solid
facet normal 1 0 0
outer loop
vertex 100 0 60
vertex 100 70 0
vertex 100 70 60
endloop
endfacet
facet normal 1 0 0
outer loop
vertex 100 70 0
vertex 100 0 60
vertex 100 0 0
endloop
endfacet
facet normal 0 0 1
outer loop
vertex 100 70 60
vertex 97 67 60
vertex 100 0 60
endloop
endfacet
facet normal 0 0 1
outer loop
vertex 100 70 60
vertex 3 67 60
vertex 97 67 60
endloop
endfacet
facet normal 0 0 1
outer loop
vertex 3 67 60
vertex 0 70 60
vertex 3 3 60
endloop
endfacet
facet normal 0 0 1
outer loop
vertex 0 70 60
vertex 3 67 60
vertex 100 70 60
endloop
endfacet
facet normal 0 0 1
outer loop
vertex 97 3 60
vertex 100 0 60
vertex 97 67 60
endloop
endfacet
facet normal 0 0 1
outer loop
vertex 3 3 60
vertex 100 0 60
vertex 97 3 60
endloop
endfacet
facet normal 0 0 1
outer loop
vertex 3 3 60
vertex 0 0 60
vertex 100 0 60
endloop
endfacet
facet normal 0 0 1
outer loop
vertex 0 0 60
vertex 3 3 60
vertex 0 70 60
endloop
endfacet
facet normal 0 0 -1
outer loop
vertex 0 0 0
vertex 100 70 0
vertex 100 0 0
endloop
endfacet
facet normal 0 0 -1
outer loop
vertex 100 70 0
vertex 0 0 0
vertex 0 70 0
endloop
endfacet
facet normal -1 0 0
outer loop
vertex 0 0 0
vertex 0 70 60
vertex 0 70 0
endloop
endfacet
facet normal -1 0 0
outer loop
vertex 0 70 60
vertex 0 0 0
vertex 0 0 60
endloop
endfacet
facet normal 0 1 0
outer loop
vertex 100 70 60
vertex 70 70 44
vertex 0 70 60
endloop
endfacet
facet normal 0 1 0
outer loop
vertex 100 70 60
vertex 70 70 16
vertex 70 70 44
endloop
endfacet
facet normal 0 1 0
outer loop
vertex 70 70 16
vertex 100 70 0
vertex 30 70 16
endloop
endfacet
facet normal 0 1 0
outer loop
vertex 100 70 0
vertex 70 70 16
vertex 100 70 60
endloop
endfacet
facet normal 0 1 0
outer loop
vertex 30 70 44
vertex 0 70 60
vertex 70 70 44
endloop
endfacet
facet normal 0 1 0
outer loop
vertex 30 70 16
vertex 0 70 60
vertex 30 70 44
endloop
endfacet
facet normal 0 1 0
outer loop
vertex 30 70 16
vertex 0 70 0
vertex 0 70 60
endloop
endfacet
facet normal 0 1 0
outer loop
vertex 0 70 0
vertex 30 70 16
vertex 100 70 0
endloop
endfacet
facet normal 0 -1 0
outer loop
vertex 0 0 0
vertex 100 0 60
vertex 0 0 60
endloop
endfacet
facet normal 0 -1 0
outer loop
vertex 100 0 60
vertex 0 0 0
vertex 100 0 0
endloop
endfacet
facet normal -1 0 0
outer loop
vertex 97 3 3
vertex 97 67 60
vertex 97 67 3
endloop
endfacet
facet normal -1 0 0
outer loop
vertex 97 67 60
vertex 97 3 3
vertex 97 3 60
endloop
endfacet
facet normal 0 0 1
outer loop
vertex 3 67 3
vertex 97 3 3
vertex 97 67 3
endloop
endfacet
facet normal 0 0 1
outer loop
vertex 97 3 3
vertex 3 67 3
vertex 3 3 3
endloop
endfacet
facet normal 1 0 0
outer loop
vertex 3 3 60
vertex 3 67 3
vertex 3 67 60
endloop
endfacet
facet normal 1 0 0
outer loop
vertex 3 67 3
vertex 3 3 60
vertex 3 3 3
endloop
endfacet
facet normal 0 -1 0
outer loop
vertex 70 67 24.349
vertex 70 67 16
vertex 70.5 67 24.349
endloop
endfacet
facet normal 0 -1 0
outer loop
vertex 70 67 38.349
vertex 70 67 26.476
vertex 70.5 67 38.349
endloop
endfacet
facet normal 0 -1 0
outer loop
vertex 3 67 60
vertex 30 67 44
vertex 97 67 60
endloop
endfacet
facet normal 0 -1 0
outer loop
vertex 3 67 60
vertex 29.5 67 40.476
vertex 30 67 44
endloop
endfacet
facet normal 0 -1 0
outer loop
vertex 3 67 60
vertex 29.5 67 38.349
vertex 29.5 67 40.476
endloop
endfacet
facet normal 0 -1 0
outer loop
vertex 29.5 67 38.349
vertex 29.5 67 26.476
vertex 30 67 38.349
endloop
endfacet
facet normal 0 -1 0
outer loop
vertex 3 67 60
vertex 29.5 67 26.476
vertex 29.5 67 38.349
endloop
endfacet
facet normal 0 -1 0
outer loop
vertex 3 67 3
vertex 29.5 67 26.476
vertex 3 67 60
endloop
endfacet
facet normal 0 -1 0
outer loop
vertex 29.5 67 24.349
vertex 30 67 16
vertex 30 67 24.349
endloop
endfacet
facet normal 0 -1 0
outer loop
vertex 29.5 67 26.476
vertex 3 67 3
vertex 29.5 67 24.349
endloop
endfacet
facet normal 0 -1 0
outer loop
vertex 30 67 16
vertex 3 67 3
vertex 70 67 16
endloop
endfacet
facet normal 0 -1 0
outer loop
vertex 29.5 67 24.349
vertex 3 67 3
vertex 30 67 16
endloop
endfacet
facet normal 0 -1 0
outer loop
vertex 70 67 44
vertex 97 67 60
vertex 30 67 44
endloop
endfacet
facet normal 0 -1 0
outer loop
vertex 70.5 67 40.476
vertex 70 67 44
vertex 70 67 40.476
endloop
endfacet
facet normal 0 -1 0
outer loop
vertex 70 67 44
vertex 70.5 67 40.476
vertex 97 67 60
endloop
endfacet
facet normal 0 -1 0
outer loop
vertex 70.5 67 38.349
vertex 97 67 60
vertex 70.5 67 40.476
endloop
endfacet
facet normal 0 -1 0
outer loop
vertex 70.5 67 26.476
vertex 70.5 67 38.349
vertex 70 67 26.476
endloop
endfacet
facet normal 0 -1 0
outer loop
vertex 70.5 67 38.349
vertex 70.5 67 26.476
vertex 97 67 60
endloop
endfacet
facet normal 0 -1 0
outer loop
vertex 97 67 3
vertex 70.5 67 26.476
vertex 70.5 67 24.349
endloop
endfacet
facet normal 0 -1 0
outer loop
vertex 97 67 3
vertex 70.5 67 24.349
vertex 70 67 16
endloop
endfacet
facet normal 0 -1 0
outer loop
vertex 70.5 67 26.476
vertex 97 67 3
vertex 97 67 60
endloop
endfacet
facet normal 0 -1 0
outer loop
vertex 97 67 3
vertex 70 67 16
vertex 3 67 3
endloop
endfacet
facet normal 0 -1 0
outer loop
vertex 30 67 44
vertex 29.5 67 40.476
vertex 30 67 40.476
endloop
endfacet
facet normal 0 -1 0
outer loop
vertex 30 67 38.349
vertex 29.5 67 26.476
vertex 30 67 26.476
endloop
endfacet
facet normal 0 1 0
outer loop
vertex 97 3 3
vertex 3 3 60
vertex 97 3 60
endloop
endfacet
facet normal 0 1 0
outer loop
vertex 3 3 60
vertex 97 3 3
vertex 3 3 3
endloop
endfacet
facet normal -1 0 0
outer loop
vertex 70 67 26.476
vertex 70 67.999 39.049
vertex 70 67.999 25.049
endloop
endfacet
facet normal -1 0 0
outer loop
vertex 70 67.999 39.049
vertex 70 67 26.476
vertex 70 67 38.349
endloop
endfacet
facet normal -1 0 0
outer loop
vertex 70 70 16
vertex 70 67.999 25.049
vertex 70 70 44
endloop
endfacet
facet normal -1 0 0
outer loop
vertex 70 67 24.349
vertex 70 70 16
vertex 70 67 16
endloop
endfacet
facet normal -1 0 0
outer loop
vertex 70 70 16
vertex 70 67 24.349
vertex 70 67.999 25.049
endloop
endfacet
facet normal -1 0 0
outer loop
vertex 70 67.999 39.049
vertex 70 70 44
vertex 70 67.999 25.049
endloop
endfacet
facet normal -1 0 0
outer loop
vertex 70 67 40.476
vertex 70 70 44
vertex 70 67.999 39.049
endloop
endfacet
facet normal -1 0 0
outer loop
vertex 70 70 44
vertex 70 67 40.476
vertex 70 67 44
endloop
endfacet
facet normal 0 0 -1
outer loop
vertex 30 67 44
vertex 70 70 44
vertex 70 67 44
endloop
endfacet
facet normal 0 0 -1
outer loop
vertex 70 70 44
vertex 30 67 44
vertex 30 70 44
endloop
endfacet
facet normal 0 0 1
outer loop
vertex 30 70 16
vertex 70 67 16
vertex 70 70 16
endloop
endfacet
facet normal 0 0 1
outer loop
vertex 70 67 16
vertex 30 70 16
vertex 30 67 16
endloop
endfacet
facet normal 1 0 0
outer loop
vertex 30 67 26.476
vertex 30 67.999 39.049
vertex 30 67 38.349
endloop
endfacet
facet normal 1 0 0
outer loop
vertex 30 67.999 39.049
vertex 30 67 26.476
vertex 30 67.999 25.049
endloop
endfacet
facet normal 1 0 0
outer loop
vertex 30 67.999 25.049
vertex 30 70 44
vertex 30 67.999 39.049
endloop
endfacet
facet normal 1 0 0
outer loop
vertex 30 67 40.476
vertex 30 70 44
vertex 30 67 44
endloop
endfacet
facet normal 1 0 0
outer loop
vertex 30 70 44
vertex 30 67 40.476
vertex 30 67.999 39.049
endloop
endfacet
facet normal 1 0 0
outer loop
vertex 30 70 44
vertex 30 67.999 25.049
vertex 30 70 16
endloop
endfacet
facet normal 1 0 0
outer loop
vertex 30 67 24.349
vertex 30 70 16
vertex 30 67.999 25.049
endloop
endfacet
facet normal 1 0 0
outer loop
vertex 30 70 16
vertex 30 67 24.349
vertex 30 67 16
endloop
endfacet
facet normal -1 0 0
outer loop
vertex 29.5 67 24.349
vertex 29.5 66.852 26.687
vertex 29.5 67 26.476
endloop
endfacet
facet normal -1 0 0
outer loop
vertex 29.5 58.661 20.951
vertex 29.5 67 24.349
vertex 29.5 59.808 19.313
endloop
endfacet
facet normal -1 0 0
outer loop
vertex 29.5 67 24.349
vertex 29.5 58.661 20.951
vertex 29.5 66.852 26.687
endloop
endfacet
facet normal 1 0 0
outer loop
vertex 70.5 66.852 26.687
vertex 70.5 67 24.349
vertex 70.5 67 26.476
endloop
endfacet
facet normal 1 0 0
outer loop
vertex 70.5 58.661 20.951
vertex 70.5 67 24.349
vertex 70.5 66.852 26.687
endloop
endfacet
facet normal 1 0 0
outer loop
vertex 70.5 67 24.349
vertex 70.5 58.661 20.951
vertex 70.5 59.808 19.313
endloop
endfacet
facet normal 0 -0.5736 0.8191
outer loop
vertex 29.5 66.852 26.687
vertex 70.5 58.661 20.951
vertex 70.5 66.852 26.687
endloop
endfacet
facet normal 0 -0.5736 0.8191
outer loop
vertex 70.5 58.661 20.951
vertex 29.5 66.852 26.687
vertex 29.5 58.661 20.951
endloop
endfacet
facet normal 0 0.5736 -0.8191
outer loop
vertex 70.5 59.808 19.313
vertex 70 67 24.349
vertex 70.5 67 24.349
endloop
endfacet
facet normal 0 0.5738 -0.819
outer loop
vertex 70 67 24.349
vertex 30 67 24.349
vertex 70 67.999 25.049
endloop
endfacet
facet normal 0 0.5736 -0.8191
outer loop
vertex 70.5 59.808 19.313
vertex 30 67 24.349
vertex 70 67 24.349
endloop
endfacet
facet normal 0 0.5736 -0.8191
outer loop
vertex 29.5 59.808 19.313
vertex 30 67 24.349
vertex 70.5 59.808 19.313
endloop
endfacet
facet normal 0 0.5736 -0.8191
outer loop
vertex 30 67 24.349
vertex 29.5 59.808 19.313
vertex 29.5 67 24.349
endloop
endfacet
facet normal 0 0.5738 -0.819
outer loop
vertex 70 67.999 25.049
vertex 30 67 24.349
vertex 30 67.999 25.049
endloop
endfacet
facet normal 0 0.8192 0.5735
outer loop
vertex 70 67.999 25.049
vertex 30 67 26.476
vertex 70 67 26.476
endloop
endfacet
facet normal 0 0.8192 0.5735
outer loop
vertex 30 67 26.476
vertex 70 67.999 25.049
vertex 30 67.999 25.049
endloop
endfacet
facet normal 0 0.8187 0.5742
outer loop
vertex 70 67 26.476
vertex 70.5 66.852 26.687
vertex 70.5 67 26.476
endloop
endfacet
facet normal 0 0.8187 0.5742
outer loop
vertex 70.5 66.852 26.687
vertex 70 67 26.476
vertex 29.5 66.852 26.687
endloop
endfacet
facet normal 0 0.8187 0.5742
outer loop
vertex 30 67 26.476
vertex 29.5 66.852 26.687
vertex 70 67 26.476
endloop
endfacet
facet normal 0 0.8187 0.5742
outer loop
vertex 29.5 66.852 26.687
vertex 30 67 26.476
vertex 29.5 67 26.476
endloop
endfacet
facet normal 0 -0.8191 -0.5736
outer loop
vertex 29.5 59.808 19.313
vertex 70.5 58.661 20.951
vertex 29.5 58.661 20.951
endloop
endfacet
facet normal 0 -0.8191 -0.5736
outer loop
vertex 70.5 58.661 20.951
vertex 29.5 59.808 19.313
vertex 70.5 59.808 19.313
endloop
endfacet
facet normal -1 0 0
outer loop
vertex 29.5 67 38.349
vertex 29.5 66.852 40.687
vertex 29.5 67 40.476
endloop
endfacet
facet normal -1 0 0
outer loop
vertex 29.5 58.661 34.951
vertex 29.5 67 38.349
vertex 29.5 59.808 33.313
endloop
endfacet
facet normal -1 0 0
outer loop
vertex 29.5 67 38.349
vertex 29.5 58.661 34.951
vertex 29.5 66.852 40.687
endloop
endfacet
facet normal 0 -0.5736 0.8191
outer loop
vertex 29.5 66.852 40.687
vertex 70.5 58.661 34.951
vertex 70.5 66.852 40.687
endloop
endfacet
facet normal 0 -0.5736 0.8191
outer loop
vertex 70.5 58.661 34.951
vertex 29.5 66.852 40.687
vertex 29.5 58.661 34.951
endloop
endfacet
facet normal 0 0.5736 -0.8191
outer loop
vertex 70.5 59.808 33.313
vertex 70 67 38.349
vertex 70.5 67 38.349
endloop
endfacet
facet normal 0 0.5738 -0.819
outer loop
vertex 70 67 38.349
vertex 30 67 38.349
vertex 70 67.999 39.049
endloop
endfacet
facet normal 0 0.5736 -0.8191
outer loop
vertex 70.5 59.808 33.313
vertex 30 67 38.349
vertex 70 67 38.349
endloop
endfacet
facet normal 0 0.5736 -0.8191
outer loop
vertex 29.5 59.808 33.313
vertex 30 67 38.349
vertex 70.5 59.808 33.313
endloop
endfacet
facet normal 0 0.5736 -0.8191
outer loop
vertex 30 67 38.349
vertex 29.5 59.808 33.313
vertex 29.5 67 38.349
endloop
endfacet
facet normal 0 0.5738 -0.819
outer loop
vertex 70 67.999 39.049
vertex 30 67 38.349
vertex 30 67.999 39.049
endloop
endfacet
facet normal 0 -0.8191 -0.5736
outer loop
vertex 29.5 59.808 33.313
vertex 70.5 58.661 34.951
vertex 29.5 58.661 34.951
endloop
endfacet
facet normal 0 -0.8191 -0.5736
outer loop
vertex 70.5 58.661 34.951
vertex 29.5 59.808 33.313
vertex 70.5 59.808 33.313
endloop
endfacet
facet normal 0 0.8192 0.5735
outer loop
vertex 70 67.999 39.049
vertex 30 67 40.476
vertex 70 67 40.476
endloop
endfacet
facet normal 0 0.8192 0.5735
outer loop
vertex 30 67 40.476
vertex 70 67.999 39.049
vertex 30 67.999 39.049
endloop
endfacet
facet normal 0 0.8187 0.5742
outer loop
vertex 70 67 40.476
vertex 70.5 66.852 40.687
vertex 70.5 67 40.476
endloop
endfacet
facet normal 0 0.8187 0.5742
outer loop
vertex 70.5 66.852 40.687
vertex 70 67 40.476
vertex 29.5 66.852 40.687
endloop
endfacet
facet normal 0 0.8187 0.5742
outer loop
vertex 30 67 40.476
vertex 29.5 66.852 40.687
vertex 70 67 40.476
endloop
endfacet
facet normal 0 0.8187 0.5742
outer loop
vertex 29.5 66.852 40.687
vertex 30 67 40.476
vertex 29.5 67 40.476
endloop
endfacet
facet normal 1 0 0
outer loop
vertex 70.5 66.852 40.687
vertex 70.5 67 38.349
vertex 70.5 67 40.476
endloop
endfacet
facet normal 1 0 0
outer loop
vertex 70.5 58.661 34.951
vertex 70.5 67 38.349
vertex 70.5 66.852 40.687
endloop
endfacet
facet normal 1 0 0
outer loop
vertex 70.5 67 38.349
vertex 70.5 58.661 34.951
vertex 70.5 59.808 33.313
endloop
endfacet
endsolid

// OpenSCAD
$fn = 32;

// ----------------------------------------------------------------------
// Vent box: louvers enclosure
// ----------------------------------------------------------------------

// --- parameters (mm) ---
box_l = 100;              // box length, X
box_w = 70;               // box width, Y
box_h = 60;               // box height, Z
wall_t = 3;               // shell wall thickness
win_l = 40;               // vent window width, X
win_h = 28;               // vent window height, Z
slat_t = 2;               // louver slat thickness
slat_d = 10;              // louver slat depth
slat_a = 35;              // louver slat angle, degrees
slat_pitch = 14;          // louver pitch
slat_yc = 63.33;          // slat centreline Y

win_z0 = (box_h - win_h) / 2;  // window lower edge Z
n_slats = 2;  // louver count
slat_z0 = win_z0 + (win_h - (n_slats - 1) * slat_pitch) / 2;

difference() {
  union() {
    difference() {
      cube([box_l, box_w, box_h]);
  translate([wall_t, wall_t, wall_t])
    cube([box_l - 2 * wall_t, box_w - 2 * wall_t, box_h]);
  translate([(box_l - win_l) / 2, box_w - wall_t - 1, win_z0])
    cube([win_l, wall_t + 2, win_h]);
    }
    for (i = [0 : n_slats - 1])
      translate([box_l / 2, slat_yc, slat_z0 + i * slat_pitch])
        rotate([slat_a, 0, 0])
          cube([win_l + 1, slat_d, slat_t], center = true);
  }
}
